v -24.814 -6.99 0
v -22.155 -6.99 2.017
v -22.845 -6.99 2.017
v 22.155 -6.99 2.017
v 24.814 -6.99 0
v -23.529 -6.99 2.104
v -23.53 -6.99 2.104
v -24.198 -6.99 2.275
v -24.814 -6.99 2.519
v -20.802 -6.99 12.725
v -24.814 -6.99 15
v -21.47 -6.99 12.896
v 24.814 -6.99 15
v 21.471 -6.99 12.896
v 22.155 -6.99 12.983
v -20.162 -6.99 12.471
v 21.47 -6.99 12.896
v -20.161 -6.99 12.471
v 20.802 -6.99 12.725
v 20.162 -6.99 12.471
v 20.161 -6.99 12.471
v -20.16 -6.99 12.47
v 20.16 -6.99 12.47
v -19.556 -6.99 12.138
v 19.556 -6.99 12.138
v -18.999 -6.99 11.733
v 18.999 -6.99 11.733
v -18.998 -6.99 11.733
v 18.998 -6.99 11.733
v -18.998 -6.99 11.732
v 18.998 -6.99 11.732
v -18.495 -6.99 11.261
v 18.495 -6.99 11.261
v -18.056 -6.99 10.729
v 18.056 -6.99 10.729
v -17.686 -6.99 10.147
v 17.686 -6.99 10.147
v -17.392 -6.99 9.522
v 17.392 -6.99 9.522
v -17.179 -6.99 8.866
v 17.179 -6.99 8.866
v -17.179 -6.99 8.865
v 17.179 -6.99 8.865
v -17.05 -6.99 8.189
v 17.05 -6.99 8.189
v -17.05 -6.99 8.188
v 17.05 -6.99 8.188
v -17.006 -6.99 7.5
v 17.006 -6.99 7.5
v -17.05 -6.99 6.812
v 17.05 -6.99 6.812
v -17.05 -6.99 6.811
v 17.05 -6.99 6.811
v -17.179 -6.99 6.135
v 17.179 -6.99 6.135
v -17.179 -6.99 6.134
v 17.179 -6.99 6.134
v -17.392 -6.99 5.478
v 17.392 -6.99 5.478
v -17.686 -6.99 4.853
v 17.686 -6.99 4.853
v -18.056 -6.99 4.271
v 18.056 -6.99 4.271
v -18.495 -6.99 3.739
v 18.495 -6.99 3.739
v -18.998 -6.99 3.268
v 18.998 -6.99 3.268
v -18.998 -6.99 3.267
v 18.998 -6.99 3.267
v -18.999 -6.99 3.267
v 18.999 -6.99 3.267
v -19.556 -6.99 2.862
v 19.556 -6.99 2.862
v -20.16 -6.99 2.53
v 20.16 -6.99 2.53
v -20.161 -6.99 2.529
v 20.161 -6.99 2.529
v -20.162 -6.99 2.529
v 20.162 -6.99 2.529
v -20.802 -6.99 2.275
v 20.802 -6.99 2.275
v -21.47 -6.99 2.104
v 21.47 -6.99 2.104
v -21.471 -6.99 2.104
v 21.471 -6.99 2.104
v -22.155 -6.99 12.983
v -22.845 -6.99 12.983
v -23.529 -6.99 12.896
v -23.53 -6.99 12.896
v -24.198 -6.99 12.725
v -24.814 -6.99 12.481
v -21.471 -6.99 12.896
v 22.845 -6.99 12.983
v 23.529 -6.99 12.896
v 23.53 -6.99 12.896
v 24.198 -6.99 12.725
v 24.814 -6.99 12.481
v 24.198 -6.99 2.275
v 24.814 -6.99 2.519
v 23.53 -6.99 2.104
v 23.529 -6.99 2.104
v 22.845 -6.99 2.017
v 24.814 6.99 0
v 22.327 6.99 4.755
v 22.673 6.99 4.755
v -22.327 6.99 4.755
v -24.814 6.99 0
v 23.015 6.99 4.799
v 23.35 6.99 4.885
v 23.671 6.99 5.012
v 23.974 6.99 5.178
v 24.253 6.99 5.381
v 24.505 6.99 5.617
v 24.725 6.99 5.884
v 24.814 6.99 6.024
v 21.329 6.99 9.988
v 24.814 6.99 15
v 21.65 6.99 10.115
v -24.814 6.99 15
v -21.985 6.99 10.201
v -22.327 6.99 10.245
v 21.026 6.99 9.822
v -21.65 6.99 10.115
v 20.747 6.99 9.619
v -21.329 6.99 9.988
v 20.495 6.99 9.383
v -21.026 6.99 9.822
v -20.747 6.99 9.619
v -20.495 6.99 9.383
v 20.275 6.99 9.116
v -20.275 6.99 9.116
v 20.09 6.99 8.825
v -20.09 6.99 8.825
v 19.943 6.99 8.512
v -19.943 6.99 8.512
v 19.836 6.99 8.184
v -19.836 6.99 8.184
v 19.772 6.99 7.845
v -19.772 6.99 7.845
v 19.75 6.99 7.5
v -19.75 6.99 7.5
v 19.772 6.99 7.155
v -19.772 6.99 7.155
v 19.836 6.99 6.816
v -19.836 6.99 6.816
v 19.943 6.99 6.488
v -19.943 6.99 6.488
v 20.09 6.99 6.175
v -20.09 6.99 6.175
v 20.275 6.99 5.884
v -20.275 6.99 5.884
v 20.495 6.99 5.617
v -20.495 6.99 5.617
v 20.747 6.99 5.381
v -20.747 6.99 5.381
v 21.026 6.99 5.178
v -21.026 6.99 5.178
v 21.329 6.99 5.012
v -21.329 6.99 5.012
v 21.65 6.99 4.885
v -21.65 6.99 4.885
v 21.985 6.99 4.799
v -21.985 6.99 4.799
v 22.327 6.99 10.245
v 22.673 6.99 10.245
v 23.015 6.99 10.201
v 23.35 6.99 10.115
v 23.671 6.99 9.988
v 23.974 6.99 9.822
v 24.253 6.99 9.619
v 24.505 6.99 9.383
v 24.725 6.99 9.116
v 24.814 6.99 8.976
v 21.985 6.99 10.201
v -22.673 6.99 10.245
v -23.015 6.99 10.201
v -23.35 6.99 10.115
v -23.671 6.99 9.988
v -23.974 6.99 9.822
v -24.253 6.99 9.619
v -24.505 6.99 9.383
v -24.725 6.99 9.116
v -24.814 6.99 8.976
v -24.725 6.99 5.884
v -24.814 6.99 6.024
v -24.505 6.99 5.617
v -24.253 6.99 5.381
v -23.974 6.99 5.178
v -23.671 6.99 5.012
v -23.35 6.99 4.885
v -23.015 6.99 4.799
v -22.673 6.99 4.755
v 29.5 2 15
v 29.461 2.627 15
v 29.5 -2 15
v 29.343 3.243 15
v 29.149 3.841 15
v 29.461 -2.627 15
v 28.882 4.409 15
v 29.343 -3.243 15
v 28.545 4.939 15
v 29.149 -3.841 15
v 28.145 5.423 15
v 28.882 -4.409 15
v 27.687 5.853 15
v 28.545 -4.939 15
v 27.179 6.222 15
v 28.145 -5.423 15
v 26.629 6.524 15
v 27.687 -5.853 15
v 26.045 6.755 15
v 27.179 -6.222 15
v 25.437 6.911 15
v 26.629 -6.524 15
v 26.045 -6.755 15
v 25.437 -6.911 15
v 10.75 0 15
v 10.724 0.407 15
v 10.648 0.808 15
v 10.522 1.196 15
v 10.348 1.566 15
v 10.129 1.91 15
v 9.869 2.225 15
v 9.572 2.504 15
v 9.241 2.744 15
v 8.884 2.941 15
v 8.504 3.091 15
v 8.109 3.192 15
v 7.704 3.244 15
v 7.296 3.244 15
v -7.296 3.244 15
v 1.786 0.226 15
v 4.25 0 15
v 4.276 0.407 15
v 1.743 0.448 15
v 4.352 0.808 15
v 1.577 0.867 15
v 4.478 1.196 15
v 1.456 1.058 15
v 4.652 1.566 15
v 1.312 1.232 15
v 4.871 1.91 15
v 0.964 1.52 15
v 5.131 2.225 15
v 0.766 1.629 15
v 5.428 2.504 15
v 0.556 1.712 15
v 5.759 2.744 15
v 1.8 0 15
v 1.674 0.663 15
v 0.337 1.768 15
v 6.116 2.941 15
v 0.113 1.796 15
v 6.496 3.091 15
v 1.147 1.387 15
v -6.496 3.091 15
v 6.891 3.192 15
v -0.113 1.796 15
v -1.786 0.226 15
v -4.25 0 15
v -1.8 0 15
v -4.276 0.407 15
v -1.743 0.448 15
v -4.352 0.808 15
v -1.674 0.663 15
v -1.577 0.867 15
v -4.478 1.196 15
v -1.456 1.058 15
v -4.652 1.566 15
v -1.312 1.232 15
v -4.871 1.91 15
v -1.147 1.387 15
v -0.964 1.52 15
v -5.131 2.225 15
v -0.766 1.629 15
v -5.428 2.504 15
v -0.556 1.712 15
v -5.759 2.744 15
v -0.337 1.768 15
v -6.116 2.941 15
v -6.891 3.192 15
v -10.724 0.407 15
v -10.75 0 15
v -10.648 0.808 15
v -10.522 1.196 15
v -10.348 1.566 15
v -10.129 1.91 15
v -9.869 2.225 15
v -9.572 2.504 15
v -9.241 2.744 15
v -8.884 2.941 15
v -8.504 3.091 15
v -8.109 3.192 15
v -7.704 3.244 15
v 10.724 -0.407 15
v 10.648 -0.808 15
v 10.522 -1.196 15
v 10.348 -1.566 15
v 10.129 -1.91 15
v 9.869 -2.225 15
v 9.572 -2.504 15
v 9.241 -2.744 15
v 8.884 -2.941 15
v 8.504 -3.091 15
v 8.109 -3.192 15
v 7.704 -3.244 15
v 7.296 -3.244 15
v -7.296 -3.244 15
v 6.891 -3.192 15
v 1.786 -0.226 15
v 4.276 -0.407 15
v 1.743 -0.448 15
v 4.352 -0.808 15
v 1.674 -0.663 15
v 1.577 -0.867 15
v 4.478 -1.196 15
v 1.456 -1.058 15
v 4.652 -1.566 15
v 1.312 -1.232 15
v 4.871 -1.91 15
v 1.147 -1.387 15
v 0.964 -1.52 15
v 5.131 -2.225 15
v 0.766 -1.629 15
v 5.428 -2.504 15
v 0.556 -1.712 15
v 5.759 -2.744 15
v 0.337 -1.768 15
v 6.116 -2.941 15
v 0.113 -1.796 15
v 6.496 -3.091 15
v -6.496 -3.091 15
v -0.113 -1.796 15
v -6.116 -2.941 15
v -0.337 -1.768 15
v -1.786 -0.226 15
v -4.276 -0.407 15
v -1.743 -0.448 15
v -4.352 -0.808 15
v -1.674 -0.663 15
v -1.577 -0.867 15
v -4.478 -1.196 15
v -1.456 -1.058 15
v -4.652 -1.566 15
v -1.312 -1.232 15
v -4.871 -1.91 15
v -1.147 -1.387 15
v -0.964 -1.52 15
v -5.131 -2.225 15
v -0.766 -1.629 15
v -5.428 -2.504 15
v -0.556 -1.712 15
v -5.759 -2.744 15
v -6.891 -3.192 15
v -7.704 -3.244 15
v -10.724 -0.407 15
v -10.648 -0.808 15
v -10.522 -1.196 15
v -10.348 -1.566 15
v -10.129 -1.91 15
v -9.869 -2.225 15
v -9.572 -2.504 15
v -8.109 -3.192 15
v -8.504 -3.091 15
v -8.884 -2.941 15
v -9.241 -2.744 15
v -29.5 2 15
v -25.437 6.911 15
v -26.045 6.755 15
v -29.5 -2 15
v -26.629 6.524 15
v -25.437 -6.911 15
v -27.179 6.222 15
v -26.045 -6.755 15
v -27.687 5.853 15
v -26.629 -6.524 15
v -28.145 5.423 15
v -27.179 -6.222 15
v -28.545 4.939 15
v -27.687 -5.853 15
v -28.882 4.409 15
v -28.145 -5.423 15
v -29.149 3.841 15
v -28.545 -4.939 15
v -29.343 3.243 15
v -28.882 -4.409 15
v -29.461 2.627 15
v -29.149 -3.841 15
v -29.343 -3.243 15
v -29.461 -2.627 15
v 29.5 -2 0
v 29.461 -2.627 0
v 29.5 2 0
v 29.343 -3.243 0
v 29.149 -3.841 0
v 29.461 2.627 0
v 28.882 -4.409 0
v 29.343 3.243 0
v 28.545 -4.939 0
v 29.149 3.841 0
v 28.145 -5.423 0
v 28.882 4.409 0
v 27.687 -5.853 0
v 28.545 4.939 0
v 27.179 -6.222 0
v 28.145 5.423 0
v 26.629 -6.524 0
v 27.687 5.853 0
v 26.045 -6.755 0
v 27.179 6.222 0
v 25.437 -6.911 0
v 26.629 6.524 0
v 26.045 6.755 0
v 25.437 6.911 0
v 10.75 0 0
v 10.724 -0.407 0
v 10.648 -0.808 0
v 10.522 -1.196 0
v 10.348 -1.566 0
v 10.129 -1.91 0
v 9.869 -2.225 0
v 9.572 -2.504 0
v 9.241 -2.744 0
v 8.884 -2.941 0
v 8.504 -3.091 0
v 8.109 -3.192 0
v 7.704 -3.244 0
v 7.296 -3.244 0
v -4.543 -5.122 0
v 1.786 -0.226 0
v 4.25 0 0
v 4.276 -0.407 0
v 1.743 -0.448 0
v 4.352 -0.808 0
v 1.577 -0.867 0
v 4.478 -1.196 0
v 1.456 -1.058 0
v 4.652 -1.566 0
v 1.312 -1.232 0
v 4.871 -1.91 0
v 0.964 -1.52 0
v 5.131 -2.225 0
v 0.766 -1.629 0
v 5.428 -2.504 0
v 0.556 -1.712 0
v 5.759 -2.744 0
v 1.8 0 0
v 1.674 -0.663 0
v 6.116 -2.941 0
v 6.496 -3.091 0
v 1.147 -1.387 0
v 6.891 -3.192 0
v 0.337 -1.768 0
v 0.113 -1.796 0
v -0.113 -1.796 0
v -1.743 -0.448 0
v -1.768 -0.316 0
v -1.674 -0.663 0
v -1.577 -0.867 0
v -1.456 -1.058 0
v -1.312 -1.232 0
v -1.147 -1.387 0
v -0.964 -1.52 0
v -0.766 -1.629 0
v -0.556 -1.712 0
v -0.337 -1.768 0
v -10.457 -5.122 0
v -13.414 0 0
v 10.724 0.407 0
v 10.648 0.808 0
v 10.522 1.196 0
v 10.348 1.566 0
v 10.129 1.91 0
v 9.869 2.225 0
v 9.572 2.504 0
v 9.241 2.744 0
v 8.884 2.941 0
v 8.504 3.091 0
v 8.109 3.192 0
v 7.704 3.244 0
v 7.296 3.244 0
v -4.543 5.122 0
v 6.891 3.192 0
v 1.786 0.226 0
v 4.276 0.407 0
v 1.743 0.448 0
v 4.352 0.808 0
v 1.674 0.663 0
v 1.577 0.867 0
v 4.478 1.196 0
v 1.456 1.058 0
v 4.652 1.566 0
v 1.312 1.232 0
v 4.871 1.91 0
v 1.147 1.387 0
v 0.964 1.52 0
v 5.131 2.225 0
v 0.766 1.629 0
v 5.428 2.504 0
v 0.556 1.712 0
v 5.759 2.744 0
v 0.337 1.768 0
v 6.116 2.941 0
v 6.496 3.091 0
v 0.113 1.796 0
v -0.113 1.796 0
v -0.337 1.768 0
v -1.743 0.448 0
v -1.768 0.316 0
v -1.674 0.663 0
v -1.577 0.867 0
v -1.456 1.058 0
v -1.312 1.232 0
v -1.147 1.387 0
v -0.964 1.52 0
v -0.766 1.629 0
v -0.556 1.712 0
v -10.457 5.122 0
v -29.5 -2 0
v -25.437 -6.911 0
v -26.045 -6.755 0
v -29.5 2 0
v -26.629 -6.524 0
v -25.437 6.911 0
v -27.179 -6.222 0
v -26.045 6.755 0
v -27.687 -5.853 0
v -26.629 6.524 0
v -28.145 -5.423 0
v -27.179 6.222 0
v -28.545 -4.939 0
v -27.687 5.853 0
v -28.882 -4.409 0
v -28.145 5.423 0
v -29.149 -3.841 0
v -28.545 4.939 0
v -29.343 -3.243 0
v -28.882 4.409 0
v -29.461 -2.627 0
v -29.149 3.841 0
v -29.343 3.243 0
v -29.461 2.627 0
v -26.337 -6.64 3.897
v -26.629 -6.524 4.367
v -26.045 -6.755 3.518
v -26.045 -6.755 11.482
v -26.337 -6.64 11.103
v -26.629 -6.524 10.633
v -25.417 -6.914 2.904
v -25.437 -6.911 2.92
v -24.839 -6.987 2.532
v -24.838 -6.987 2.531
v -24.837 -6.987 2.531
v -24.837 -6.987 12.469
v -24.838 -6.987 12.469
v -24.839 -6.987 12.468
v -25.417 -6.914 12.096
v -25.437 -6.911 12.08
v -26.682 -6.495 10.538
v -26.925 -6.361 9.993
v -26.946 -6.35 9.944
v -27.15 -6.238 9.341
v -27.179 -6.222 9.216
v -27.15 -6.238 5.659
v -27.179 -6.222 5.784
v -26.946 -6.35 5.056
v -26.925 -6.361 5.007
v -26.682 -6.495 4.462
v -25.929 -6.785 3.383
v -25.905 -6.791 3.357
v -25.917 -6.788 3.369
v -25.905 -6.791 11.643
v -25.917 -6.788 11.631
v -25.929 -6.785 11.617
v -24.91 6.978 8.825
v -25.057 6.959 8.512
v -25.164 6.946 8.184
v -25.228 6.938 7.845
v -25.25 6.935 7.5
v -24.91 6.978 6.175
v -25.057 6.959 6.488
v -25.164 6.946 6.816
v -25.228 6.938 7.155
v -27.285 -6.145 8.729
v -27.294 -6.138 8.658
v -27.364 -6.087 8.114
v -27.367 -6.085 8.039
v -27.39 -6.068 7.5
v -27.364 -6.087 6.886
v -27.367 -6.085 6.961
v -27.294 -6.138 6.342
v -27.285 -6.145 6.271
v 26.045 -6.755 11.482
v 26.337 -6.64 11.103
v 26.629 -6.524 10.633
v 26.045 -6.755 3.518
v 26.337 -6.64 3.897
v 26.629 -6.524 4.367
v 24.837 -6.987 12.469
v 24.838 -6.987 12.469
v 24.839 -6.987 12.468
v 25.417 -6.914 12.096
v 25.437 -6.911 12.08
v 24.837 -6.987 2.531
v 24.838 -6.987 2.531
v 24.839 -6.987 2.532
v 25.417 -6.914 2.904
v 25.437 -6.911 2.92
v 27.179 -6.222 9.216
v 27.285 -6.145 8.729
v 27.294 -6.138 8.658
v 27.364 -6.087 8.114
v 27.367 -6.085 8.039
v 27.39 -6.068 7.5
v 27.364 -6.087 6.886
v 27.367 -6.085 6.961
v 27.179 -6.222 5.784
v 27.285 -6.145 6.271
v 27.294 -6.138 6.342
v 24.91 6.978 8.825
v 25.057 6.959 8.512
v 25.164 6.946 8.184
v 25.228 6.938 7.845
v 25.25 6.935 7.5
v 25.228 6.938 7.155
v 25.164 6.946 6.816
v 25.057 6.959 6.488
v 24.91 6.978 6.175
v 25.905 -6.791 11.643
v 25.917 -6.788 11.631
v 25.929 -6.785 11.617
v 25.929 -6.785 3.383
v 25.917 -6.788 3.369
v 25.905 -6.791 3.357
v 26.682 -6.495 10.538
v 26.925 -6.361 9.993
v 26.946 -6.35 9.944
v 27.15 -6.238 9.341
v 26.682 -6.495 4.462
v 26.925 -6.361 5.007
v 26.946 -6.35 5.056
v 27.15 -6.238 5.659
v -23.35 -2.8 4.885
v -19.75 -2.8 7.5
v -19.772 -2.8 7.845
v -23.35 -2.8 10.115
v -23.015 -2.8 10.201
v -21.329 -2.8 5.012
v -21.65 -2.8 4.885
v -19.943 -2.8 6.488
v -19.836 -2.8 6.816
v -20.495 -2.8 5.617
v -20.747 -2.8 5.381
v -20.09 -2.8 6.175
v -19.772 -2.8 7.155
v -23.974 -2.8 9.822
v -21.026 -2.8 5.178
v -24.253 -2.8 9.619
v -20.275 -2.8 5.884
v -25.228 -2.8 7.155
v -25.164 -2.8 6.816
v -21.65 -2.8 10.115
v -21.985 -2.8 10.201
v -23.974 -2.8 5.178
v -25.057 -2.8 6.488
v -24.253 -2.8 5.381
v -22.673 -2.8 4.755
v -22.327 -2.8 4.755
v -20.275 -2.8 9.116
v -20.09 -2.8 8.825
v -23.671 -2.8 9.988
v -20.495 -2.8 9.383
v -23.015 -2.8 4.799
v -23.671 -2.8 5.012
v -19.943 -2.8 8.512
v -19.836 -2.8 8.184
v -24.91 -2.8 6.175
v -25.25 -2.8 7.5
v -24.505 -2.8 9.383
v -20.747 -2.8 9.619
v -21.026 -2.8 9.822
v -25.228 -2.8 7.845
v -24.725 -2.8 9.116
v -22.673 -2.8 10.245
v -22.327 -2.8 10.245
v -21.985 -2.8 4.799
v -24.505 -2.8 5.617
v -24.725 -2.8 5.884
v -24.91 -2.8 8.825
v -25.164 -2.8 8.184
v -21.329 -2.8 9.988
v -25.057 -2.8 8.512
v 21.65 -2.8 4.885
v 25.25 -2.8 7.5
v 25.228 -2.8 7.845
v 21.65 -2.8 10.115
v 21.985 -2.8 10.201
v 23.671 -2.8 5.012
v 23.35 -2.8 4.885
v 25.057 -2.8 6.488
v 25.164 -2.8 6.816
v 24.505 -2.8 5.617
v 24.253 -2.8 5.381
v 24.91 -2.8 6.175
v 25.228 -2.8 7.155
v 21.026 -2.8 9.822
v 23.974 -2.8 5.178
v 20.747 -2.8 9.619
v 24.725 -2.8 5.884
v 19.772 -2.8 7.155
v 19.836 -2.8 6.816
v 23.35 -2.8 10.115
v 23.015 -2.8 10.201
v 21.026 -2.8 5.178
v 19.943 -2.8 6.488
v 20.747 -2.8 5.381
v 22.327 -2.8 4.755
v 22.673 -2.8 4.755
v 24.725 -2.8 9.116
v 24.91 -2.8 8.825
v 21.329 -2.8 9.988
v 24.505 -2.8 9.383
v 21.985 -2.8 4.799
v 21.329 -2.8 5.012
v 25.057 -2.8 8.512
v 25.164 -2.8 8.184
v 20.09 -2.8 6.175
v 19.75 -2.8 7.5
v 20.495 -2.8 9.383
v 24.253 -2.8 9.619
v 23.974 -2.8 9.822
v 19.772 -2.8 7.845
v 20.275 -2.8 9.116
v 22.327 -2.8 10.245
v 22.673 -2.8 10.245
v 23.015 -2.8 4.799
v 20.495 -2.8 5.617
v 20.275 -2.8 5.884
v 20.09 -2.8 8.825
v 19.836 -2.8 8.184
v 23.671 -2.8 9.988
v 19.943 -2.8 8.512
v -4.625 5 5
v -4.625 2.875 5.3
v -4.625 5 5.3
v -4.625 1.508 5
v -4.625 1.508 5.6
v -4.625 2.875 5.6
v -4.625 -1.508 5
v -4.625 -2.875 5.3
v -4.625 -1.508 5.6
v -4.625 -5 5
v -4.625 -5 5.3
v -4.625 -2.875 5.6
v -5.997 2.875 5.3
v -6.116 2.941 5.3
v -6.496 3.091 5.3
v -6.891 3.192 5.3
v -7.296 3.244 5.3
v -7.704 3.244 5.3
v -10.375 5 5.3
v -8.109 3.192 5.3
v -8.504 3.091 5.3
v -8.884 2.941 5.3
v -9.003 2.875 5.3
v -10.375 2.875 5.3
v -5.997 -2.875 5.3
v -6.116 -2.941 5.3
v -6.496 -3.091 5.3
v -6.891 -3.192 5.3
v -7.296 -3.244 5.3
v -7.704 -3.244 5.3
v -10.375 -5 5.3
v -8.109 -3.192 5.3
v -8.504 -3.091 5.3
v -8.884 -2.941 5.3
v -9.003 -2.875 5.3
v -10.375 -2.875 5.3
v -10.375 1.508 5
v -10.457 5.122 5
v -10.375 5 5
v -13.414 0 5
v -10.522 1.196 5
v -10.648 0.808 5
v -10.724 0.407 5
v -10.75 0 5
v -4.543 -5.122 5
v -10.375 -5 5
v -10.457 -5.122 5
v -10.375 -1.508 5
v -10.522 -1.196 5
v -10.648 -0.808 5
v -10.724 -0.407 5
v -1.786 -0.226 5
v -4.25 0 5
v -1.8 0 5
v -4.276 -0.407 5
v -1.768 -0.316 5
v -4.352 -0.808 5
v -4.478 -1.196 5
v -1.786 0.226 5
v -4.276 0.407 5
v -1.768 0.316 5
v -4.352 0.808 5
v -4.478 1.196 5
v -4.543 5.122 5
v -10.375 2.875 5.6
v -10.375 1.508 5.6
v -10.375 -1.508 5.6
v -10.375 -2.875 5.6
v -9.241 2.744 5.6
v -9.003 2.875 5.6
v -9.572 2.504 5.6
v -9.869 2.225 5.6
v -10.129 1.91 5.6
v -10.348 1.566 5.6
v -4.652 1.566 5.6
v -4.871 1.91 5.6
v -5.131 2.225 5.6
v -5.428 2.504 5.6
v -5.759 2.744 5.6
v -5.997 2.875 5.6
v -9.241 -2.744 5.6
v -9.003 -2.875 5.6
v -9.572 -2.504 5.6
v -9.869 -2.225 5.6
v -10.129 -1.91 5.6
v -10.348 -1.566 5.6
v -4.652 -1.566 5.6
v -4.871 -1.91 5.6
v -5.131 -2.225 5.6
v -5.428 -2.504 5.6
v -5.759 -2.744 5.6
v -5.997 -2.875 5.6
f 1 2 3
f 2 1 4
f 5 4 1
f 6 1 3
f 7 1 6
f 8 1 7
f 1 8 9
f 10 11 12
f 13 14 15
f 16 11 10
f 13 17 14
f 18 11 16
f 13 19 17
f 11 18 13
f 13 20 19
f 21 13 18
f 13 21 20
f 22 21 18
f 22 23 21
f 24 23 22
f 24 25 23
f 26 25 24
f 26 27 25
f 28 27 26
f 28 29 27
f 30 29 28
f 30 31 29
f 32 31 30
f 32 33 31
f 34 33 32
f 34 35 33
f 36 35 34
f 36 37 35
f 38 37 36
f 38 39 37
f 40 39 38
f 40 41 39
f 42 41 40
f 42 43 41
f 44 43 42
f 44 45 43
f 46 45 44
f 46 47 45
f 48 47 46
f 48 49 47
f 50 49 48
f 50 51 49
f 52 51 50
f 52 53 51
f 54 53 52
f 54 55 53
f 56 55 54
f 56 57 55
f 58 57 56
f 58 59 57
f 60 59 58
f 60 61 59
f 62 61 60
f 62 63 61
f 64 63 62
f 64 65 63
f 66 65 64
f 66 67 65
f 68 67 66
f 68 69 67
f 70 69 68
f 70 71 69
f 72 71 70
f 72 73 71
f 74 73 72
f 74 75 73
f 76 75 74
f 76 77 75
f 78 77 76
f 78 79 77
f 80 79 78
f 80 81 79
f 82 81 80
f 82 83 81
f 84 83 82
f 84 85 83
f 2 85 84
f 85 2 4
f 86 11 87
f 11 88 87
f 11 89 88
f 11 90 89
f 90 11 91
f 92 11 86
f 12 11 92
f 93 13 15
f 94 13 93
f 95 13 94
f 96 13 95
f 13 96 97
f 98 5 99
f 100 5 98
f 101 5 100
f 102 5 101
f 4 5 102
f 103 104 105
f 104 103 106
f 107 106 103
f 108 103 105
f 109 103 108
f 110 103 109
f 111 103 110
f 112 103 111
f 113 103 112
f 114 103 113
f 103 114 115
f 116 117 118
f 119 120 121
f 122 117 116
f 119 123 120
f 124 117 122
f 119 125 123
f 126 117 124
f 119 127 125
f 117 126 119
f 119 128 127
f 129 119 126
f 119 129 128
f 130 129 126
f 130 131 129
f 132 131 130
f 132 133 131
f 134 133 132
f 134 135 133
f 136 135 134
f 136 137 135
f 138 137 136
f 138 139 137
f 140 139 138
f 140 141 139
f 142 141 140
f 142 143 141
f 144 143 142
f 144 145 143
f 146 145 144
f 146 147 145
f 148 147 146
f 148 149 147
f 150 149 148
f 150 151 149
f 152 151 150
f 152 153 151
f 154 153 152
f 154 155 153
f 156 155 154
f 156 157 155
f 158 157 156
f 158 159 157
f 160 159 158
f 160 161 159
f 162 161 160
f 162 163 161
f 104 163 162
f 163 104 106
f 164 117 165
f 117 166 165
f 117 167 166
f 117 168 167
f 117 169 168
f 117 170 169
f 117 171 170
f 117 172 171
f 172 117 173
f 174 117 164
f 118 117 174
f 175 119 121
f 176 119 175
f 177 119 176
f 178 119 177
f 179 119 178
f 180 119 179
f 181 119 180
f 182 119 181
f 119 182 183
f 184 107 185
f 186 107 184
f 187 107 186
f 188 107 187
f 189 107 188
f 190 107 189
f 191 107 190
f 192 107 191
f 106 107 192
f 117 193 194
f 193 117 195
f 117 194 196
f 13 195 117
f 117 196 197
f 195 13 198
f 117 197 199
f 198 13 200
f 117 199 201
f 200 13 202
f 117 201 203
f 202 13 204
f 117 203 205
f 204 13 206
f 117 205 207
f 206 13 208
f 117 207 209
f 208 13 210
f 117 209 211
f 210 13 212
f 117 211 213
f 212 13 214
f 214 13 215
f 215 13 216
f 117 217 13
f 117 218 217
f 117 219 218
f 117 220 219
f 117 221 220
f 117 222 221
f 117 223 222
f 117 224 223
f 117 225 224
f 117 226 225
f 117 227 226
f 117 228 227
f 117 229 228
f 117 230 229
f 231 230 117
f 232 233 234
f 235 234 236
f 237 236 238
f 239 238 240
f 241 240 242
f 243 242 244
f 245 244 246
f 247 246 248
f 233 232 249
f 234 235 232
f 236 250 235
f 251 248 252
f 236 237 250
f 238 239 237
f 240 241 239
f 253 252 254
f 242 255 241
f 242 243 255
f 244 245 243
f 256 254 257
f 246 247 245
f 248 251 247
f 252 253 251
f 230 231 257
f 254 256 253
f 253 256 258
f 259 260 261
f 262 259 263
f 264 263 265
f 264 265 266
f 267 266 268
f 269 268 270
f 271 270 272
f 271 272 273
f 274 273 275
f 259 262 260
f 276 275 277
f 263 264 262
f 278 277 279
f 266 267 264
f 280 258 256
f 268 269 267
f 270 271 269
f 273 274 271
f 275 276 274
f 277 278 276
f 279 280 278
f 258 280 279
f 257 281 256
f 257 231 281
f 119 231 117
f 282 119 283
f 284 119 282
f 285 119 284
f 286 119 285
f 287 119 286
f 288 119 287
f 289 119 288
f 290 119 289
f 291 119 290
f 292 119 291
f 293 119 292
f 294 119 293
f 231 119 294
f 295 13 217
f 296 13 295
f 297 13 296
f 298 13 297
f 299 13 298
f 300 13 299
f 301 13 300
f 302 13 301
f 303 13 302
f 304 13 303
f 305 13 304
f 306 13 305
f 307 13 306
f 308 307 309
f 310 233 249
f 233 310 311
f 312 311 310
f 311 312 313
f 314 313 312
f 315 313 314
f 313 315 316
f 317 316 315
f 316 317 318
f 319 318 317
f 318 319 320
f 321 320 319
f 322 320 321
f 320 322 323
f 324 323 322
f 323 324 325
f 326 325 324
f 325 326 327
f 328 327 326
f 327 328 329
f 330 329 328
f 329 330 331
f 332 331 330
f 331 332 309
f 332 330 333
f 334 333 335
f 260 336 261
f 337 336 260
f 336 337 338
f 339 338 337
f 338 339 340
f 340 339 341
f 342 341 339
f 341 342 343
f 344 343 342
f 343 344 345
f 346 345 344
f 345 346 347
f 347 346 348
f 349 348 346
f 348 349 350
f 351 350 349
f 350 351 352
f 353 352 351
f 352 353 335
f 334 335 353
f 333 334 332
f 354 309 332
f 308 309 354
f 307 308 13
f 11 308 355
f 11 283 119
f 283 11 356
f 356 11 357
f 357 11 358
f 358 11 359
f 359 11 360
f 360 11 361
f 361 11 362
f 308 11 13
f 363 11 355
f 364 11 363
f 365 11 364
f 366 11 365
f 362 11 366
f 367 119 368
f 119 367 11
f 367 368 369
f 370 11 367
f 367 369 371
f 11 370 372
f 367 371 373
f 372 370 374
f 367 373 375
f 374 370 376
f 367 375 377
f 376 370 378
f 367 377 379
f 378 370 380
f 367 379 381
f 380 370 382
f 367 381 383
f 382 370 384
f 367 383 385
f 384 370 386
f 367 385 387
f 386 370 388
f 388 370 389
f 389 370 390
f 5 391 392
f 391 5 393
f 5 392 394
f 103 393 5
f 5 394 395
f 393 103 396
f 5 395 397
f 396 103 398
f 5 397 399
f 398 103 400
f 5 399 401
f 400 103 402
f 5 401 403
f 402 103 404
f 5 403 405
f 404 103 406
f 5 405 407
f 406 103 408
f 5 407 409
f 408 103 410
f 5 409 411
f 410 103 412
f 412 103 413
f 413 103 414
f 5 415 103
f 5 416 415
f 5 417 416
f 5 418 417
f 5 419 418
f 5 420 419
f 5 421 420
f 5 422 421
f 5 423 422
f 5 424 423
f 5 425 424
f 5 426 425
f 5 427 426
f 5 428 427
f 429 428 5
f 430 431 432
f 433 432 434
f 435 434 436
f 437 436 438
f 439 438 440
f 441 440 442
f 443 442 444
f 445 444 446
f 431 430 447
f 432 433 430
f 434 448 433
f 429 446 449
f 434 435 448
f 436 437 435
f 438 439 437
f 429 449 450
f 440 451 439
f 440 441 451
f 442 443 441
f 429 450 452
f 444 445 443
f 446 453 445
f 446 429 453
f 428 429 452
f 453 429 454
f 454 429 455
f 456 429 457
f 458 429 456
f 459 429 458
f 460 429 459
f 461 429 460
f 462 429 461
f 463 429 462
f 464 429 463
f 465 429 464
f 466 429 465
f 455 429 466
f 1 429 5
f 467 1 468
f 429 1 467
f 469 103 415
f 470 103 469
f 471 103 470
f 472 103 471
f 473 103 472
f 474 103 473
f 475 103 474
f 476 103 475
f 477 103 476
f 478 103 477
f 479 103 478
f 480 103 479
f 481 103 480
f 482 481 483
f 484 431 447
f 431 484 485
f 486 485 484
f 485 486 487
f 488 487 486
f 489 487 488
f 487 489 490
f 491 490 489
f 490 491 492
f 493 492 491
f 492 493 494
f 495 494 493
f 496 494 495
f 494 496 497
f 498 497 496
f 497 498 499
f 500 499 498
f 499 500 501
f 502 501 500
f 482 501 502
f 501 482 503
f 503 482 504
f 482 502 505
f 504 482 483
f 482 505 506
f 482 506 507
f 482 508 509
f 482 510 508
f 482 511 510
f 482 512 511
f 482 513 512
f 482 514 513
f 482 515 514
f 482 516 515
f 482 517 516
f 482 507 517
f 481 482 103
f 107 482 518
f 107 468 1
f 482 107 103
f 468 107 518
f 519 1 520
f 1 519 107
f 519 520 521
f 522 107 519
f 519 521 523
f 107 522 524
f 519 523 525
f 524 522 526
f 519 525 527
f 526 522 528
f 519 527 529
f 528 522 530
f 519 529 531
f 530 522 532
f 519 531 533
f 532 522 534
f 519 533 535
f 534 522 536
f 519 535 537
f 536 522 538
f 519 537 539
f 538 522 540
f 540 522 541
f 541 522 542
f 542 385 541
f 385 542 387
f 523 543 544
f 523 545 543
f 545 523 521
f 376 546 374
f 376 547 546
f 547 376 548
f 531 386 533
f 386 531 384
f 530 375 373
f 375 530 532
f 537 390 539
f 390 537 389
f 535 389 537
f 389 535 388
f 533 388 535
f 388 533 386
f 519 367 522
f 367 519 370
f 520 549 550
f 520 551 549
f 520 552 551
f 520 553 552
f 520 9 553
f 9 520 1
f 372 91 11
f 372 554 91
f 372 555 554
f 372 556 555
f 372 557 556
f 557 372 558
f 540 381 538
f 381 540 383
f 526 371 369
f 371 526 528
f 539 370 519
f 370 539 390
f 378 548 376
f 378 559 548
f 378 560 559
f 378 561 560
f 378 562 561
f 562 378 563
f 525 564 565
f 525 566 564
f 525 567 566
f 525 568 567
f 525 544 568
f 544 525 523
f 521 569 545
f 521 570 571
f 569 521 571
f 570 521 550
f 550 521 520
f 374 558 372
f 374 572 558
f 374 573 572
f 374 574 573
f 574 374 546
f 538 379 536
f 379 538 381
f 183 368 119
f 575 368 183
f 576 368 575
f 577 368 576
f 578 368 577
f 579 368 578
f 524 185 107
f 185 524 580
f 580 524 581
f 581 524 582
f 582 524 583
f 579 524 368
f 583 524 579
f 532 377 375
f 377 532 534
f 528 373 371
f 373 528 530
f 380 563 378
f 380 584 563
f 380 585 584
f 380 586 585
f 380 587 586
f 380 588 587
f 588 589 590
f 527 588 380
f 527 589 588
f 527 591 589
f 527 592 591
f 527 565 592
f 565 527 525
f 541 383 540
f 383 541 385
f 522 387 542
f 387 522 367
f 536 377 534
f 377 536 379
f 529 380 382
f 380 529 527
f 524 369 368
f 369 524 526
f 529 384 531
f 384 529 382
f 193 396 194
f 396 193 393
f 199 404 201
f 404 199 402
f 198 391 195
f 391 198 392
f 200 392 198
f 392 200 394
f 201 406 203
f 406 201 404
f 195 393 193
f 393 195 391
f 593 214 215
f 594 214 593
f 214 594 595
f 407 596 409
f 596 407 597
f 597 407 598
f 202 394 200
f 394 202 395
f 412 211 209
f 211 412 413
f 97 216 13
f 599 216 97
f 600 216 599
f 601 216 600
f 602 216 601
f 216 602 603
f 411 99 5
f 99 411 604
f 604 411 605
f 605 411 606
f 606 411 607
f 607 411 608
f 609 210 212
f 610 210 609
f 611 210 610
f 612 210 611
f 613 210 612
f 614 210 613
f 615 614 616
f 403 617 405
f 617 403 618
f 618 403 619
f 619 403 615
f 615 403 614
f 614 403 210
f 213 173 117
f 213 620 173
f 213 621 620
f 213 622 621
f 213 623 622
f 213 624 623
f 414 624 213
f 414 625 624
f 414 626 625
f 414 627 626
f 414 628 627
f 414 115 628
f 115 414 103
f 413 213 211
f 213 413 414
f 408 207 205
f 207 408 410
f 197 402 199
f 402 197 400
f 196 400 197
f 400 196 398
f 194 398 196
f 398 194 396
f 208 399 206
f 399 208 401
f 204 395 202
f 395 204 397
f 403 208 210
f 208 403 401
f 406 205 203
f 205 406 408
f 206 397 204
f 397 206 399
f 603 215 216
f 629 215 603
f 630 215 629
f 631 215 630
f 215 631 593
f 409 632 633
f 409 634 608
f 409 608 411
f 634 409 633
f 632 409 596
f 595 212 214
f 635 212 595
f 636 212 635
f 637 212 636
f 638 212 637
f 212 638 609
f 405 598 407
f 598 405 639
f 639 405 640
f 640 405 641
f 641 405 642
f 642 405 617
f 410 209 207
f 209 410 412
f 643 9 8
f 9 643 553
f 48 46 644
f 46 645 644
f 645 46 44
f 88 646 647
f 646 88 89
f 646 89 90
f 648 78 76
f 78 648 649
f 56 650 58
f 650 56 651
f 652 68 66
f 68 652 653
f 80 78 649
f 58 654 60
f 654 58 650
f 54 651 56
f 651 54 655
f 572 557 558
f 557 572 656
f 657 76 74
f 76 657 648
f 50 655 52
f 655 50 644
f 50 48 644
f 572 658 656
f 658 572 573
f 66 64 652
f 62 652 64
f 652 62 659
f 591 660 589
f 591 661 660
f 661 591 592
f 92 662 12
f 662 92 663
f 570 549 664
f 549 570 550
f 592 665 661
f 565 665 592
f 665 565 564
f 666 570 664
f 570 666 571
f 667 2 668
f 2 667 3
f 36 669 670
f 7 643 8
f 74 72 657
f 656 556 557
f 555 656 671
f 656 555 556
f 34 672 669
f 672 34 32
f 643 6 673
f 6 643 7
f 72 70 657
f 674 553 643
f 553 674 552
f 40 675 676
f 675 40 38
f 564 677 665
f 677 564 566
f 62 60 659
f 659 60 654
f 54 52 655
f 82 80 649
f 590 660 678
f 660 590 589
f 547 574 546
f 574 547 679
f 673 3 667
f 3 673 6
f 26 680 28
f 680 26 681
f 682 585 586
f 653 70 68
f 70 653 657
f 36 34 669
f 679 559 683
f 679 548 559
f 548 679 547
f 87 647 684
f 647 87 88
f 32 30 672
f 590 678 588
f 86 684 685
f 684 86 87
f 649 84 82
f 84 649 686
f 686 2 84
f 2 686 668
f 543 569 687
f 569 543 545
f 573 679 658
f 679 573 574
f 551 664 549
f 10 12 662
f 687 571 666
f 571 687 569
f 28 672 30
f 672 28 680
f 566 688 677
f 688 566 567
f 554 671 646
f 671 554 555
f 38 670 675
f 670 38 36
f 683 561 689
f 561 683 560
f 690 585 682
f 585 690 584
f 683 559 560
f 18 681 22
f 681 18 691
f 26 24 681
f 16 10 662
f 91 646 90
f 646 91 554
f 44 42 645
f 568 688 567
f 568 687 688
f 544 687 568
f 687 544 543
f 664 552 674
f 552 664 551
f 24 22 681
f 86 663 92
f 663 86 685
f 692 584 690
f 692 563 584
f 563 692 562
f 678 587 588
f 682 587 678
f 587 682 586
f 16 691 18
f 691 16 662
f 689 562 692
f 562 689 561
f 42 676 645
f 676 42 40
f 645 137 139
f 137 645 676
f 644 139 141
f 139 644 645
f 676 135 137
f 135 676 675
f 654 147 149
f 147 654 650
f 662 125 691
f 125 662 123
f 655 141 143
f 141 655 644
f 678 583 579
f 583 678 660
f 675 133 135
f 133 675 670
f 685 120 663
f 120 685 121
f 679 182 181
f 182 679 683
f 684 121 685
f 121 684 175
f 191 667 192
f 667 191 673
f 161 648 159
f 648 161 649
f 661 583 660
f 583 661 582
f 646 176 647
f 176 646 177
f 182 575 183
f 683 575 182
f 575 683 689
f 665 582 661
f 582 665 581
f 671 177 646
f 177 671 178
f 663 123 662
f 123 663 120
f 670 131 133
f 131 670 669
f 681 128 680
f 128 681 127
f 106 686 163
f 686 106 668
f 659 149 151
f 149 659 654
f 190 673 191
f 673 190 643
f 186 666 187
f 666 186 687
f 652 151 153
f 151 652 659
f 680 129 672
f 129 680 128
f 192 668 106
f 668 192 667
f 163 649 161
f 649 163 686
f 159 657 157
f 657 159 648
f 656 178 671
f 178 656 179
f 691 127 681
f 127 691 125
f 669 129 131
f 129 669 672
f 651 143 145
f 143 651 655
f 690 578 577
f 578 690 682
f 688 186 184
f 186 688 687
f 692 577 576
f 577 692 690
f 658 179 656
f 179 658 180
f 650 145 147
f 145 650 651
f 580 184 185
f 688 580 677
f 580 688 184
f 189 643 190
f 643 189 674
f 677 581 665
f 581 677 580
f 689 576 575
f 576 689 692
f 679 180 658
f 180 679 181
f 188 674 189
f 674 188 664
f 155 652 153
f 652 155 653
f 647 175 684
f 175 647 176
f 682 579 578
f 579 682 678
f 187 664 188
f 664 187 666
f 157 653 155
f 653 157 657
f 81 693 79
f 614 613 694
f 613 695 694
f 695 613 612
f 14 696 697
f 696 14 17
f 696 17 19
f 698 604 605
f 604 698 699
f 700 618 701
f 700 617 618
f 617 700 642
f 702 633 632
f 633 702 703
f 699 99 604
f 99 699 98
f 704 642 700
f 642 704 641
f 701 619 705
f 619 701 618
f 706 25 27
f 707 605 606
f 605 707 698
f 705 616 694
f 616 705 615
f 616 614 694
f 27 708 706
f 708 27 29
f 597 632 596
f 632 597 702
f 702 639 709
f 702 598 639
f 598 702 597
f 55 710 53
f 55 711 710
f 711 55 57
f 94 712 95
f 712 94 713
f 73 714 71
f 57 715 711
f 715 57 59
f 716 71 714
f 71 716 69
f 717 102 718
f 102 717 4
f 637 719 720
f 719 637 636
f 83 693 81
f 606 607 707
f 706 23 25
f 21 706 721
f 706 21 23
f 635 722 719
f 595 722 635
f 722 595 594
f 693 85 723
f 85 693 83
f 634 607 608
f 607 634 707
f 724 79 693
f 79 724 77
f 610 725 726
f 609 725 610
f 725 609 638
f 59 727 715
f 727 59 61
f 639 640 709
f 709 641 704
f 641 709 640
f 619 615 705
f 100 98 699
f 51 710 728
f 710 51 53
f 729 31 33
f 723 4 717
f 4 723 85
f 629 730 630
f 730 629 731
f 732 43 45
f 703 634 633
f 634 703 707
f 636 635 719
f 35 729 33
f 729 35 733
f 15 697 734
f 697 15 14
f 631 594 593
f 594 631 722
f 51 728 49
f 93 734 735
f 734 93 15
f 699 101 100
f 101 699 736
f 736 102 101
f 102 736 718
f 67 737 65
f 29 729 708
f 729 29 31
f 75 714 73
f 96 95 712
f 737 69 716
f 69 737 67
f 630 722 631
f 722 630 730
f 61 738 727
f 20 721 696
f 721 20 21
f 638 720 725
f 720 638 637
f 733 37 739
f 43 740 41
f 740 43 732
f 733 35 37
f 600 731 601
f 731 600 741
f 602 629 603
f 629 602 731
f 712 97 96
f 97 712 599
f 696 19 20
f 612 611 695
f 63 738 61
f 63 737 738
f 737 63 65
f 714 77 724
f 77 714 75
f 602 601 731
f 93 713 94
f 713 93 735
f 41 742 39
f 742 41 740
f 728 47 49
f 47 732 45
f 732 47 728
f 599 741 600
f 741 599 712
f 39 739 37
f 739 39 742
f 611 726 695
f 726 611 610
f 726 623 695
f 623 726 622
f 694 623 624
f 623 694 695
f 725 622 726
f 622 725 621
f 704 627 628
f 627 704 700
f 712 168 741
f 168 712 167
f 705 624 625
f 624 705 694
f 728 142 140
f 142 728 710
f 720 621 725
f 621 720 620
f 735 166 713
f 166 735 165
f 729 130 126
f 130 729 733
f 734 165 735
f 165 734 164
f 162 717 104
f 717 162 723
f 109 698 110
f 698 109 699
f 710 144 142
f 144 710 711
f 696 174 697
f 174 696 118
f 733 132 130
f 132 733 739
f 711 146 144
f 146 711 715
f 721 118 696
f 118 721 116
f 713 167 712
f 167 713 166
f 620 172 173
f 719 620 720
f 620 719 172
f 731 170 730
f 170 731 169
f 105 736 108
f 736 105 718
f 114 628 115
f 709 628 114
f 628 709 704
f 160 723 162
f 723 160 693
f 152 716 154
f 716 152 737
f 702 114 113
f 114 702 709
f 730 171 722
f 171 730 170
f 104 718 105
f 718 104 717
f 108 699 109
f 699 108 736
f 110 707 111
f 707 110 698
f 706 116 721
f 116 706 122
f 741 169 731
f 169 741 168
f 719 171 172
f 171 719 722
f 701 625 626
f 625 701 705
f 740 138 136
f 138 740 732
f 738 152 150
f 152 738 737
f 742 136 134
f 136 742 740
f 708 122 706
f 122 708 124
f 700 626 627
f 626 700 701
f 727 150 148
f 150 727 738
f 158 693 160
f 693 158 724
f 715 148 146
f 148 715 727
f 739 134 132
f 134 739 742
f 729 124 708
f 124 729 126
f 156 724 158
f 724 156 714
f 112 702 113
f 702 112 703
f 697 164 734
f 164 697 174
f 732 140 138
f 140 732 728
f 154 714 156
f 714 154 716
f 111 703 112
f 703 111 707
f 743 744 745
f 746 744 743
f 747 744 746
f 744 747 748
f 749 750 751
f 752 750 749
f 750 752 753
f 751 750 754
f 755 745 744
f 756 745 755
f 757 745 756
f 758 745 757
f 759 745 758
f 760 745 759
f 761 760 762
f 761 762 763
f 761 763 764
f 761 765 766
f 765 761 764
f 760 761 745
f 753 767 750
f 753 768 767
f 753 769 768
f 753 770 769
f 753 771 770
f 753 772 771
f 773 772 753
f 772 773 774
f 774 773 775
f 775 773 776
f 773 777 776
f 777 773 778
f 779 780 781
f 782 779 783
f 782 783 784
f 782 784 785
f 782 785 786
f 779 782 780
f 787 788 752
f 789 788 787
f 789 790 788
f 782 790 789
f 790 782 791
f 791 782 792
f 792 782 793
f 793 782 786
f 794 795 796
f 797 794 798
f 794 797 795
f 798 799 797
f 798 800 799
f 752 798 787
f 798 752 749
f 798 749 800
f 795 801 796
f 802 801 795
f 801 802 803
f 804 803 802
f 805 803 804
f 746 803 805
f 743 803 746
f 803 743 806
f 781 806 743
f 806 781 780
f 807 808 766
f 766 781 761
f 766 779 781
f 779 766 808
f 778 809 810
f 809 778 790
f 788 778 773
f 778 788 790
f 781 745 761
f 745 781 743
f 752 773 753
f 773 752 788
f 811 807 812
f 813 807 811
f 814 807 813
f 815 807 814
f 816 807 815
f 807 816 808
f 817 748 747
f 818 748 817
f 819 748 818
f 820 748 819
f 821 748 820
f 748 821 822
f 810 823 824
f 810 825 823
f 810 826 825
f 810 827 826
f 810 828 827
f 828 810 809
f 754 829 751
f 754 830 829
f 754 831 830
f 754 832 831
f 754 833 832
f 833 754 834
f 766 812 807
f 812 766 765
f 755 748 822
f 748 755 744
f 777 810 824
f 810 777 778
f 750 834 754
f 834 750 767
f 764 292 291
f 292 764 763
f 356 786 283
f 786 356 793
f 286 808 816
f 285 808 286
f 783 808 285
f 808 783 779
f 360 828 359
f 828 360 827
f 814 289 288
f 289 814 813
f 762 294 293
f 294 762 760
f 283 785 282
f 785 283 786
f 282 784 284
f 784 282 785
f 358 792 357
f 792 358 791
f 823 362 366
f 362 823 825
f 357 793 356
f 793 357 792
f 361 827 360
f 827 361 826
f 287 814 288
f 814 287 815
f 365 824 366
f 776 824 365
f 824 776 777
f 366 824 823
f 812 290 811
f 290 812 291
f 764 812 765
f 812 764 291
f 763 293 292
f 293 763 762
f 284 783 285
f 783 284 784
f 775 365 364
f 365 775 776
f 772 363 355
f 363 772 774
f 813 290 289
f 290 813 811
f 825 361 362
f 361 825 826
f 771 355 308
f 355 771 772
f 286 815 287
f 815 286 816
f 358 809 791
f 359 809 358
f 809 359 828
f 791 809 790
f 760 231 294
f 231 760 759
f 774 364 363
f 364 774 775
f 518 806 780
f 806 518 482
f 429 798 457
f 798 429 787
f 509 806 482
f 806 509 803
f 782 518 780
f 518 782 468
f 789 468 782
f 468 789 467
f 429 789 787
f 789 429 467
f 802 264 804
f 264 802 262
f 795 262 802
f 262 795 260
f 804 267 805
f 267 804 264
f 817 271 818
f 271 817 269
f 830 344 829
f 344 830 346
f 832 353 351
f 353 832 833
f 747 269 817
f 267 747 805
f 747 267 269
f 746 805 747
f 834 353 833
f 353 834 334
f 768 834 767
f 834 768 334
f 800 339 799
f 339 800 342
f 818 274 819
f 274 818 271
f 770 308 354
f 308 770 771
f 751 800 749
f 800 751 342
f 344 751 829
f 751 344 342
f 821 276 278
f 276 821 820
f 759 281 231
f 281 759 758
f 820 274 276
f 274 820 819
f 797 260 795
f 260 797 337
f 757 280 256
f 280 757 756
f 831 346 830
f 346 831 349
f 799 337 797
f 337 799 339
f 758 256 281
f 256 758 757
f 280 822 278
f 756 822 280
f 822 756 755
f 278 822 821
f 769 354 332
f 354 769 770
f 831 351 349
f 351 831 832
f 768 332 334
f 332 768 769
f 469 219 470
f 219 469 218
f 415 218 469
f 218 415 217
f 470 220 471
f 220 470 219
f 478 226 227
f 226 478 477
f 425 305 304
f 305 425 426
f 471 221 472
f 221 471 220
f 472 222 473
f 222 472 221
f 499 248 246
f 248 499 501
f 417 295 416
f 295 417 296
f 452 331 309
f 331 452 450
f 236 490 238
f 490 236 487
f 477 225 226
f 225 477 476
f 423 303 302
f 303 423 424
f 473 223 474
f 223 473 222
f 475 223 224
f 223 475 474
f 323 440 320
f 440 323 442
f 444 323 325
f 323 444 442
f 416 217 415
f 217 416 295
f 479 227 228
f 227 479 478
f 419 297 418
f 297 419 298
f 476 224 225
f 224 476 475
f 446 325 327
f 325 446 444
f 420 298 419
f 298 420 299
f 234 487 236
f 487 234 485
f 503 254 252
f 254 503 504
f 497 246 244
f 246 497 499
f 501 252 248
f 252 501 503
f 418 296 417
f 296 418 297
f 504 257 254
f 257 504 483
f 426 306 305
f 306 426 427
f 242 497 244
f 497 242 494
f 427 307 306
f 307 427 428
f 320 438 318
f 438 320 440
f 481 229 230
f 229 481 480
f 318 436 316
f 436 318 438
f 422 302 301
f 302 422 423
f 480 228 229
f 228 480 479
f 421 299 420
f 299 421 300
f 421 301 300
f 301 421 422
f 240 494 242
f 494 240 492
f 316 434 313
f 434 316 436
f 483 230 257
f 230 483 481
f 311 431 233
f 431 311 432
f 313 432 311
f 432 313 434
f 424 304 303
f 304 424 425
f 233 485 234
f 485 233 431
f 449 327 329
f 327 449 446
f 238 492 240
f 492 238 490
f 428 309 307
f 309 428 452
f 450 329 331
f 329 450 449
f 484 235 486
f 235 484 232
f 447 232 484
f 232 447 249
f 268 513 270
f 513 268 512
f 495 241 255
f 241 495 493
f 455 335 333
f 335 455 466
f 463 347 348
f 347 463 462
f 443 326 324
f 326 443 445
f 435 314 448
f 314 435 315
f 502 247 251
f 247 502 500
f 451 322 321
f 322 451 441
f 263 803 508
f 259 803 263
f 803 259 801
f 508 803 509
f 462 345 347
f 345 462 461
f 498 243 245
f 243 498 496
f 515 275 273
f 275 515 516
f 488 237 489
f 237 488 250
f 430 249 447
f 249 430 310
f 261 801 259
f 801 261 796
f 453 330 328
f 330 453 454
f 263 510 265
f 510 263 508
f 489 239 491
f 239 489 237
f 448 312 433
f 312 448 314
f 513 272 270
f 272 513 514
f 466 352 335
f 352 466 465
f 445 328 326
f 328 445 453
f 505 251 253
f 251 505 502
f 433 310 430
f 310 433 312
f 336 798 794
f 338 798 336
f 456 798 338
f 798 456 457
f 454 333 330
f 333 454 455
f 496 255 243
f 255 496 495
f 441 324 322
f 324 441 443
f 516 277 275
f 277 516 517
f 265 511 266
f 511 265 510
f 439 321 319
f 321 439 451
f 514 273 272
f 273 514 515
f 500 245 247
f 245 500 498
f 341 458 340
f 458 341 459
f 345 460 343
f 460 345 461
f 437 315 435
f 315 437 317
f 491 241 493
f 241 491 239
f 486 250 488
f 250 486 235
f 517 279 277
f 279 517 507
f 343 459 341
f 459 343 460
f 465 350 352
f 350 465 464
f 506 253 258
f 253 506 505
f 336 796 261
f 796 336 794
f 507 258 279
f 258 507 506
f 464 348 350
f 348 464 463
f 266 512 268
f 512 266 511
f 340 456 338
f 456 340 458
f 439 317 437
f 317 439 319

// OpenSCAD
$fn = 50;


difference() {
	union() {
		hull() {
			translate(v = [-9.5000000000, 2.0000000000, 0]) {
				cylinder(h = 15, r = 5);
			}
			translate(v = [9.5000000000, 2.0000000000, 0]) {
				cylinder(h = 15, r = 5);
			}
			translate(v = [-9.5000000000, -2.0000000000, 0]) {
				cylinder(h = 15, r = 5);
			}
			translate(v = [9.5000000000, -2.0000000000, 0]) {
				cylinder(h = 15, r = 5);
			}
		}
		translate(v = [-15.0000000000, 0.0000000000, 0]) {
			hull() {
				translate(v = [-9.5000000000, 2.0000000000, 0]) {
					cylinder(h = 15, r = 5);
				}
				translate(v = [9.5000000000, 2.0000000000, 0]) {
					cylinder(h = 15, r = 5);
				}
				translate(v = [-9.5000000000, -2.0000000000, 0]) {
					cylinder(h = 15, r = 5);
				}
				translate(v = [9.5000000000, -2.0000000000, 0]) {
					cylinder(h = 15, r = 5);
				}
			}
		}
		translate(v = [-15.0000000000, 0.0000000000, 0]) {
			hull() {
				translate(v = [-9.5000000000, 2.0000000000, 0]) {
					cylinder(h = 15, r = 5);
				}
				translate(v = [9.5000000000, 2.0000000000, 0]) {
					cylinder(h = 15, r = 5);
				}
				translate(v = [-9.5000000000, -2.0000000000, 0]) {
					cylinder(h = 15, r = 5);
				}
				translate(v = [9.5000000000, -2.0000000000, 0]) {
					cylinder(h = 15, r = 5);
				}
			}
		}
		translate(v = [15.0000000000, 0.0000000000, 0]) {
			hull() {
				translate(v = [-9.5000000000, 2.0000000000, 0]) {
					cylinder(h = 15, r = 5);
				}
				translate(v = [9.5000000000, 2.0000000000, 0]) {
					cylinder(h = 15, r = 5);
				}
				translate(v = [-9.5000000000, -2.0000000000, 0]) {
					cylinder(h = 15, r = 5);
				}
				translate(v = [9.5000000000, -2.0000000000, 0]) {
					cylinder(h = 15, r = 5);
				}
			}
		}
		translate(v = [15.0000000000, 0.0000000000, 0]) {
			hull() {
				translate(v = [-9.5000000000, 2.0000000000, 0]) {
					cylinder(h = 15, r = 5);
				}
				translate(v = [9.5000000000, 2.0000000000, 0]) {
					cylinder(h = 15, r = 5);
				}
				translate(v = [-9.5000000000, -2.0000000000, 0]) {
					cylinder(h = 15, r = 5);
				}
				translate(v = [9.5000000000, -2.0000000000, 0]) {
					cylinder(h = 15, r = 5);
				}
			}
		}
	}
	union() {
		translate(v = [-22.5000000000, -7.0000000000, 7.5000000000]) {
			rotate(a = [90, 0, 0]) {
				difference() {
					union() {
						#translate(v = [0, 0, -14.0000000000]) {
							cylinder(h = 14, r = 2.2500000000);
						}
						#translate(v = [0, 0, -4.2000000000]) {
							cylinder(h = 4.2000000000, r1 = 2.7500000000, r2 = 5.5000000000);
						}
						#translate(v = [0, 0, -14.0000000000]) {
							cylinder(h = 14, r = 2.7500000000);
						}
						#translate(v = [0, 0, -14.0000000000]) {
							cylinder(h = 14, r = 2.2500000000);
						}
					}
					union();
				}
			}
		}
		translate(v = [22.5000000000, -7.0000000000, 7.5000000000]) {
			rotate(a = [90, 0, 0]) {
				difference() {
					union() {
						#translate(v = [0, 0, -14.0000000000]) {
							cylinder(h = 14, r = 2.2500000000);
						}
						#translate(v = [0, 0, -4.2000000000]) {
							cylinder(h = 4.2000000000, r1 = 2.7500000000, r2 = 5.5000000000);
						}
						#translate(v = [0, 0, -14.0000000000]) {
							cylinder(h = 14, r = 2.7500000000);
						}
						#translate(v = [0, 0, -14.0000000000]) {
							cylinder(h = 14, r = 2.2500000000);
						}
					}
					union();
				}
			}
		}
		translate(v = [-7.5000000000, 0.0000000000, 0]) {
			rotate(a = [0, 0, 0]) {
				difference() {
					union() {
						#translate(v = [-2.8750000000, -5.0000000000, -0.3000000000]) {
							cube(size = [5.7500000000, 10, 0.3000000000]);
						}
						#translate(v = [-2.8750000000, -2.8750000000, -0.6000000000]) {
							cube(size = [5.7500000000, 5.7500000000, 0.3000000000]);
						}
						#translate(v = [-2.8750000000, -5.0000000000, 5]) {
							cube(size = [5.7500000000, 10, 0.3000000000]);
						}
						#translate(v = [-2.8750000000, -2.8750000000, 5.3000000000]) {
							cube(size = [5.7500000000, 5.7500000000, 0.3000000000]);
						}
						#translate(v = [0, 0, -100.0000000000]) {
							cylinder(h = 200, r = 3.2500000000);
						}
						#linear_extrude(height = 5) {
							polygon(points = [[5.9142500000, 0.0000000000], [2.9571250000, 5.1218907443], [-2.9571250000, 5.1218907443], [-5.9142500000, 0.0000000000], [-2.9571250000, -5.1218907443], [2.9571250000, -5.1218907443]]);
						}
						#translate(v = [-2.8750000000, -5.0000000000, -0.3000000000]) {
							cube(size = [5.7500000000, 10, 0.3000000000]);
						}
						#translate(v = [-2.8750000000, -2.8750000000, -0.6000000000]) {
							cube(size = [5.7500000000, 5.7500000000, 0.3000000000]);
						}
						#translate(v = [-2.8750000000, -5.0000000000, 5]) {
							cube(size = [5.7500000000, 10, 0.3000000000]);
						}
						#translate(v = [-2.8750000000, -2.8750000000, 5.3000000000]) {
							cube(size = [5.7500000000, 5.7500000000, 0.3000000000]);
						}
						#translate(v = [0, 0, -100.0000000000]) {
							cylinder(h = 200, r = 3.2500000000);
						}
						#translate(v = [-2.8750000000, -5.0000000000, -0.3000000000]) {
							cube(size = [5.7500000000, 10, 0.3000000000]);
						}
						#translate(v = [-2.8750000000, -2.8750000000, -0.6000000000]) {
							cube(size = [5.7500000000, 5.7500000000, 0.3000000000]);
						}
						#translate(v = [-2.8750000000, -5.0000000000, 5]) {
							cube(size = [5.7500000000, 10, 0.3000000000]);
						}
						#translate(v = [-2.8750000000, -2.8750000000, 5.3000000000]) {
							cube(size = [5.7500000000, 5.7500000000, 0.3000000000]);
						}
						#translate(v = [0, 0, -100.0000000000]) {
							cylinder(h = 200, r = 3.2500000000);
						}
					}
					union();
				}
			}
		}
		translate(v = [-7.5000000000, 0.0000000000, 0]) {
			translate(v = [0, 0, -100]) {
				cylinder(h = 200, r = 3.2500000000);
			}
		}
		translate(v = [7.5000000000, 0.0000000000, 0]) {
			translate(v = [0, 0, -100]) {
				cylinder(h = 200, r = 3.2500000000);
			}
		}
		translate(v = [-7.5000000000, 0.0000000000, 0]) {
			translate(v = [0, 0, -100]) {
				cylinder(h = 200, r = 1.8000000000);
			}
		}
		translate(v = [0, 0, -100]) {
			cylinder(h = 200, r = 1.8000000000);
		}
		translate(v = [7.5000000000, 0.0000000000, 0]) {
			translate(v = [0, 0, -100]) {
				cylinder(h = 200, r = 1.8000000000);
			}
		}
	}
}
